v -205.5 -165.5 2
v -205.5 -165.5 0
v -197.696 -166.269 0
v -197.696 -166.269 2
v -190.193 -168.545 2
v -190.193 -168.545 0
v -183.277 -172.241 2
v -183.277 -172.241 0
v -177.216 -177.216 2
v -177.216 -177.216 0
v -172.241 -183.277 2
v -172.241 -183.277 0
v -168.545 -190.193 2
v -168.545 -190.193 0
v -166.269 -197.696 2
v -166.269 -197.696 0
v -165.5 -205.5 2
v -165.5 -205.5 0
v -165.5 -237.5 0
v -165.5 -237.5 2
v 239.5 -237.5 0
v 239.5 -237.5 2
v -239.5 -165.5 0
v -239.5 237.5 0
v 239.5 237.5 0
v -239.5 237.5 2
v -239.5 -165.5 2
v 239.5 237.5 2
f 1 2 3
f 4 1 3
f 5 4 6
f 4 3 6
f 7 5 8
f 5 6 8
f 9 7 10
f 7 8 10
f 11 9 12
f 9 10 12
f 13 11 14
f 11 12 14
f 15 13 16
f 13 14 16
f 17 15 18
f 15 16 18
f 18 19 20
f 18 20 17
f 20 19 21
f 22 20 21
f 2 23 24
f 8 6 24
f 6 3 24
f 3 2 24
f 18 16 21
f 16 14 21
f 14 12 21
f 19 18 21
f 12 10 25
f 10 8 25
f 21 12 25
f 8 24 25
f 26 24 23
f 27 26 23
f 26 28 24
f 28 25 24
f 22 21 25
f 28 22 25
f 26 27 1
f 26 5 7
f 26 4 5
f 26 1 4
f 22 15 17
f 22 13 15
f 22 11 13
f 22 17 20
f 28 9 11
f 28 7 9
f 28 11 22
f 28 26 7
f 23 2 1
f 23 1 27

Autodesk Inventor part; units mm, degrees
ref_plane "YZ Plane" through (0, 0, 0) normal (1, 0, 0) x (0, 1, 0)
ref_plane "XZ Plane" through (0, 0, 0) normal (0, 1, 0) x (-1, 0, 0)
ref_plane "XY Plane" through (0, 0, 0) normal (0, 0, 1) x (1, 0, 0)
sketch "Sketch1" plane through (0, 0, 0) normal (0, 0, 1) x (1, 0, 0)
  line L0 (239.5, 237.5) -> (-239.5, -237.5) construction
  line L1 (-239.5, -237.5) -> (239.5, -237.5)
  line L2 (239.5, -237.5) -> (239.5, 237.5)
  line L3 (239.5, 237.5) -> (-239.5, 237.5)
  line L4 (-239.5, 237.5) -> (-239.5, -237.5)
  line L5 (-239.5, -237.5) -> (239.5, 237.5) construction
  line L6 (239.5, -237.5) -> (-239.5, 237.5) construction
  line L7 (-165.5, -237.5) -> (-165.5, -205.5)
  arc A0 (-165.5, -205.5) -> (-205.5, -165.5) centre (-205.5, -205.5) ccw
  line L8 (-205.5, -165.5) -> (-239.5, -165.5)
  point P0 (0, 0)
  dimension "d2" = 479
  dimension "d18" = 475
  dimension "d21" = 40
  dimension "d22" = 72
  dimension "d23" = 74
extrude "Plate1" add sketch "Sketch1" along normal blind 2 contours L7 A0 L8 L4 L3 L2 L1
equation "\"d3\" = Thickness"
equation "\"BendRadius\" = Thickness"
equation "\"BendReliefWidth\" = Thickness"
equation "\"BendReliefDepth\" = 0.5 * Thickness"
equation "\"CornerReliefSize\" = 4 * Thickness"
equation "\"MinimumRemnant\" = 2 * Thickness"
equation "\"TransitionRadius\" = BendRadius"
equation "\"JacobiRadiusSize\" = BendRadius"
equation "\"GapSize\" = Thickness"
equation "\"Thickness\" = 2"
properties part number "PNS waste water bin 07"
